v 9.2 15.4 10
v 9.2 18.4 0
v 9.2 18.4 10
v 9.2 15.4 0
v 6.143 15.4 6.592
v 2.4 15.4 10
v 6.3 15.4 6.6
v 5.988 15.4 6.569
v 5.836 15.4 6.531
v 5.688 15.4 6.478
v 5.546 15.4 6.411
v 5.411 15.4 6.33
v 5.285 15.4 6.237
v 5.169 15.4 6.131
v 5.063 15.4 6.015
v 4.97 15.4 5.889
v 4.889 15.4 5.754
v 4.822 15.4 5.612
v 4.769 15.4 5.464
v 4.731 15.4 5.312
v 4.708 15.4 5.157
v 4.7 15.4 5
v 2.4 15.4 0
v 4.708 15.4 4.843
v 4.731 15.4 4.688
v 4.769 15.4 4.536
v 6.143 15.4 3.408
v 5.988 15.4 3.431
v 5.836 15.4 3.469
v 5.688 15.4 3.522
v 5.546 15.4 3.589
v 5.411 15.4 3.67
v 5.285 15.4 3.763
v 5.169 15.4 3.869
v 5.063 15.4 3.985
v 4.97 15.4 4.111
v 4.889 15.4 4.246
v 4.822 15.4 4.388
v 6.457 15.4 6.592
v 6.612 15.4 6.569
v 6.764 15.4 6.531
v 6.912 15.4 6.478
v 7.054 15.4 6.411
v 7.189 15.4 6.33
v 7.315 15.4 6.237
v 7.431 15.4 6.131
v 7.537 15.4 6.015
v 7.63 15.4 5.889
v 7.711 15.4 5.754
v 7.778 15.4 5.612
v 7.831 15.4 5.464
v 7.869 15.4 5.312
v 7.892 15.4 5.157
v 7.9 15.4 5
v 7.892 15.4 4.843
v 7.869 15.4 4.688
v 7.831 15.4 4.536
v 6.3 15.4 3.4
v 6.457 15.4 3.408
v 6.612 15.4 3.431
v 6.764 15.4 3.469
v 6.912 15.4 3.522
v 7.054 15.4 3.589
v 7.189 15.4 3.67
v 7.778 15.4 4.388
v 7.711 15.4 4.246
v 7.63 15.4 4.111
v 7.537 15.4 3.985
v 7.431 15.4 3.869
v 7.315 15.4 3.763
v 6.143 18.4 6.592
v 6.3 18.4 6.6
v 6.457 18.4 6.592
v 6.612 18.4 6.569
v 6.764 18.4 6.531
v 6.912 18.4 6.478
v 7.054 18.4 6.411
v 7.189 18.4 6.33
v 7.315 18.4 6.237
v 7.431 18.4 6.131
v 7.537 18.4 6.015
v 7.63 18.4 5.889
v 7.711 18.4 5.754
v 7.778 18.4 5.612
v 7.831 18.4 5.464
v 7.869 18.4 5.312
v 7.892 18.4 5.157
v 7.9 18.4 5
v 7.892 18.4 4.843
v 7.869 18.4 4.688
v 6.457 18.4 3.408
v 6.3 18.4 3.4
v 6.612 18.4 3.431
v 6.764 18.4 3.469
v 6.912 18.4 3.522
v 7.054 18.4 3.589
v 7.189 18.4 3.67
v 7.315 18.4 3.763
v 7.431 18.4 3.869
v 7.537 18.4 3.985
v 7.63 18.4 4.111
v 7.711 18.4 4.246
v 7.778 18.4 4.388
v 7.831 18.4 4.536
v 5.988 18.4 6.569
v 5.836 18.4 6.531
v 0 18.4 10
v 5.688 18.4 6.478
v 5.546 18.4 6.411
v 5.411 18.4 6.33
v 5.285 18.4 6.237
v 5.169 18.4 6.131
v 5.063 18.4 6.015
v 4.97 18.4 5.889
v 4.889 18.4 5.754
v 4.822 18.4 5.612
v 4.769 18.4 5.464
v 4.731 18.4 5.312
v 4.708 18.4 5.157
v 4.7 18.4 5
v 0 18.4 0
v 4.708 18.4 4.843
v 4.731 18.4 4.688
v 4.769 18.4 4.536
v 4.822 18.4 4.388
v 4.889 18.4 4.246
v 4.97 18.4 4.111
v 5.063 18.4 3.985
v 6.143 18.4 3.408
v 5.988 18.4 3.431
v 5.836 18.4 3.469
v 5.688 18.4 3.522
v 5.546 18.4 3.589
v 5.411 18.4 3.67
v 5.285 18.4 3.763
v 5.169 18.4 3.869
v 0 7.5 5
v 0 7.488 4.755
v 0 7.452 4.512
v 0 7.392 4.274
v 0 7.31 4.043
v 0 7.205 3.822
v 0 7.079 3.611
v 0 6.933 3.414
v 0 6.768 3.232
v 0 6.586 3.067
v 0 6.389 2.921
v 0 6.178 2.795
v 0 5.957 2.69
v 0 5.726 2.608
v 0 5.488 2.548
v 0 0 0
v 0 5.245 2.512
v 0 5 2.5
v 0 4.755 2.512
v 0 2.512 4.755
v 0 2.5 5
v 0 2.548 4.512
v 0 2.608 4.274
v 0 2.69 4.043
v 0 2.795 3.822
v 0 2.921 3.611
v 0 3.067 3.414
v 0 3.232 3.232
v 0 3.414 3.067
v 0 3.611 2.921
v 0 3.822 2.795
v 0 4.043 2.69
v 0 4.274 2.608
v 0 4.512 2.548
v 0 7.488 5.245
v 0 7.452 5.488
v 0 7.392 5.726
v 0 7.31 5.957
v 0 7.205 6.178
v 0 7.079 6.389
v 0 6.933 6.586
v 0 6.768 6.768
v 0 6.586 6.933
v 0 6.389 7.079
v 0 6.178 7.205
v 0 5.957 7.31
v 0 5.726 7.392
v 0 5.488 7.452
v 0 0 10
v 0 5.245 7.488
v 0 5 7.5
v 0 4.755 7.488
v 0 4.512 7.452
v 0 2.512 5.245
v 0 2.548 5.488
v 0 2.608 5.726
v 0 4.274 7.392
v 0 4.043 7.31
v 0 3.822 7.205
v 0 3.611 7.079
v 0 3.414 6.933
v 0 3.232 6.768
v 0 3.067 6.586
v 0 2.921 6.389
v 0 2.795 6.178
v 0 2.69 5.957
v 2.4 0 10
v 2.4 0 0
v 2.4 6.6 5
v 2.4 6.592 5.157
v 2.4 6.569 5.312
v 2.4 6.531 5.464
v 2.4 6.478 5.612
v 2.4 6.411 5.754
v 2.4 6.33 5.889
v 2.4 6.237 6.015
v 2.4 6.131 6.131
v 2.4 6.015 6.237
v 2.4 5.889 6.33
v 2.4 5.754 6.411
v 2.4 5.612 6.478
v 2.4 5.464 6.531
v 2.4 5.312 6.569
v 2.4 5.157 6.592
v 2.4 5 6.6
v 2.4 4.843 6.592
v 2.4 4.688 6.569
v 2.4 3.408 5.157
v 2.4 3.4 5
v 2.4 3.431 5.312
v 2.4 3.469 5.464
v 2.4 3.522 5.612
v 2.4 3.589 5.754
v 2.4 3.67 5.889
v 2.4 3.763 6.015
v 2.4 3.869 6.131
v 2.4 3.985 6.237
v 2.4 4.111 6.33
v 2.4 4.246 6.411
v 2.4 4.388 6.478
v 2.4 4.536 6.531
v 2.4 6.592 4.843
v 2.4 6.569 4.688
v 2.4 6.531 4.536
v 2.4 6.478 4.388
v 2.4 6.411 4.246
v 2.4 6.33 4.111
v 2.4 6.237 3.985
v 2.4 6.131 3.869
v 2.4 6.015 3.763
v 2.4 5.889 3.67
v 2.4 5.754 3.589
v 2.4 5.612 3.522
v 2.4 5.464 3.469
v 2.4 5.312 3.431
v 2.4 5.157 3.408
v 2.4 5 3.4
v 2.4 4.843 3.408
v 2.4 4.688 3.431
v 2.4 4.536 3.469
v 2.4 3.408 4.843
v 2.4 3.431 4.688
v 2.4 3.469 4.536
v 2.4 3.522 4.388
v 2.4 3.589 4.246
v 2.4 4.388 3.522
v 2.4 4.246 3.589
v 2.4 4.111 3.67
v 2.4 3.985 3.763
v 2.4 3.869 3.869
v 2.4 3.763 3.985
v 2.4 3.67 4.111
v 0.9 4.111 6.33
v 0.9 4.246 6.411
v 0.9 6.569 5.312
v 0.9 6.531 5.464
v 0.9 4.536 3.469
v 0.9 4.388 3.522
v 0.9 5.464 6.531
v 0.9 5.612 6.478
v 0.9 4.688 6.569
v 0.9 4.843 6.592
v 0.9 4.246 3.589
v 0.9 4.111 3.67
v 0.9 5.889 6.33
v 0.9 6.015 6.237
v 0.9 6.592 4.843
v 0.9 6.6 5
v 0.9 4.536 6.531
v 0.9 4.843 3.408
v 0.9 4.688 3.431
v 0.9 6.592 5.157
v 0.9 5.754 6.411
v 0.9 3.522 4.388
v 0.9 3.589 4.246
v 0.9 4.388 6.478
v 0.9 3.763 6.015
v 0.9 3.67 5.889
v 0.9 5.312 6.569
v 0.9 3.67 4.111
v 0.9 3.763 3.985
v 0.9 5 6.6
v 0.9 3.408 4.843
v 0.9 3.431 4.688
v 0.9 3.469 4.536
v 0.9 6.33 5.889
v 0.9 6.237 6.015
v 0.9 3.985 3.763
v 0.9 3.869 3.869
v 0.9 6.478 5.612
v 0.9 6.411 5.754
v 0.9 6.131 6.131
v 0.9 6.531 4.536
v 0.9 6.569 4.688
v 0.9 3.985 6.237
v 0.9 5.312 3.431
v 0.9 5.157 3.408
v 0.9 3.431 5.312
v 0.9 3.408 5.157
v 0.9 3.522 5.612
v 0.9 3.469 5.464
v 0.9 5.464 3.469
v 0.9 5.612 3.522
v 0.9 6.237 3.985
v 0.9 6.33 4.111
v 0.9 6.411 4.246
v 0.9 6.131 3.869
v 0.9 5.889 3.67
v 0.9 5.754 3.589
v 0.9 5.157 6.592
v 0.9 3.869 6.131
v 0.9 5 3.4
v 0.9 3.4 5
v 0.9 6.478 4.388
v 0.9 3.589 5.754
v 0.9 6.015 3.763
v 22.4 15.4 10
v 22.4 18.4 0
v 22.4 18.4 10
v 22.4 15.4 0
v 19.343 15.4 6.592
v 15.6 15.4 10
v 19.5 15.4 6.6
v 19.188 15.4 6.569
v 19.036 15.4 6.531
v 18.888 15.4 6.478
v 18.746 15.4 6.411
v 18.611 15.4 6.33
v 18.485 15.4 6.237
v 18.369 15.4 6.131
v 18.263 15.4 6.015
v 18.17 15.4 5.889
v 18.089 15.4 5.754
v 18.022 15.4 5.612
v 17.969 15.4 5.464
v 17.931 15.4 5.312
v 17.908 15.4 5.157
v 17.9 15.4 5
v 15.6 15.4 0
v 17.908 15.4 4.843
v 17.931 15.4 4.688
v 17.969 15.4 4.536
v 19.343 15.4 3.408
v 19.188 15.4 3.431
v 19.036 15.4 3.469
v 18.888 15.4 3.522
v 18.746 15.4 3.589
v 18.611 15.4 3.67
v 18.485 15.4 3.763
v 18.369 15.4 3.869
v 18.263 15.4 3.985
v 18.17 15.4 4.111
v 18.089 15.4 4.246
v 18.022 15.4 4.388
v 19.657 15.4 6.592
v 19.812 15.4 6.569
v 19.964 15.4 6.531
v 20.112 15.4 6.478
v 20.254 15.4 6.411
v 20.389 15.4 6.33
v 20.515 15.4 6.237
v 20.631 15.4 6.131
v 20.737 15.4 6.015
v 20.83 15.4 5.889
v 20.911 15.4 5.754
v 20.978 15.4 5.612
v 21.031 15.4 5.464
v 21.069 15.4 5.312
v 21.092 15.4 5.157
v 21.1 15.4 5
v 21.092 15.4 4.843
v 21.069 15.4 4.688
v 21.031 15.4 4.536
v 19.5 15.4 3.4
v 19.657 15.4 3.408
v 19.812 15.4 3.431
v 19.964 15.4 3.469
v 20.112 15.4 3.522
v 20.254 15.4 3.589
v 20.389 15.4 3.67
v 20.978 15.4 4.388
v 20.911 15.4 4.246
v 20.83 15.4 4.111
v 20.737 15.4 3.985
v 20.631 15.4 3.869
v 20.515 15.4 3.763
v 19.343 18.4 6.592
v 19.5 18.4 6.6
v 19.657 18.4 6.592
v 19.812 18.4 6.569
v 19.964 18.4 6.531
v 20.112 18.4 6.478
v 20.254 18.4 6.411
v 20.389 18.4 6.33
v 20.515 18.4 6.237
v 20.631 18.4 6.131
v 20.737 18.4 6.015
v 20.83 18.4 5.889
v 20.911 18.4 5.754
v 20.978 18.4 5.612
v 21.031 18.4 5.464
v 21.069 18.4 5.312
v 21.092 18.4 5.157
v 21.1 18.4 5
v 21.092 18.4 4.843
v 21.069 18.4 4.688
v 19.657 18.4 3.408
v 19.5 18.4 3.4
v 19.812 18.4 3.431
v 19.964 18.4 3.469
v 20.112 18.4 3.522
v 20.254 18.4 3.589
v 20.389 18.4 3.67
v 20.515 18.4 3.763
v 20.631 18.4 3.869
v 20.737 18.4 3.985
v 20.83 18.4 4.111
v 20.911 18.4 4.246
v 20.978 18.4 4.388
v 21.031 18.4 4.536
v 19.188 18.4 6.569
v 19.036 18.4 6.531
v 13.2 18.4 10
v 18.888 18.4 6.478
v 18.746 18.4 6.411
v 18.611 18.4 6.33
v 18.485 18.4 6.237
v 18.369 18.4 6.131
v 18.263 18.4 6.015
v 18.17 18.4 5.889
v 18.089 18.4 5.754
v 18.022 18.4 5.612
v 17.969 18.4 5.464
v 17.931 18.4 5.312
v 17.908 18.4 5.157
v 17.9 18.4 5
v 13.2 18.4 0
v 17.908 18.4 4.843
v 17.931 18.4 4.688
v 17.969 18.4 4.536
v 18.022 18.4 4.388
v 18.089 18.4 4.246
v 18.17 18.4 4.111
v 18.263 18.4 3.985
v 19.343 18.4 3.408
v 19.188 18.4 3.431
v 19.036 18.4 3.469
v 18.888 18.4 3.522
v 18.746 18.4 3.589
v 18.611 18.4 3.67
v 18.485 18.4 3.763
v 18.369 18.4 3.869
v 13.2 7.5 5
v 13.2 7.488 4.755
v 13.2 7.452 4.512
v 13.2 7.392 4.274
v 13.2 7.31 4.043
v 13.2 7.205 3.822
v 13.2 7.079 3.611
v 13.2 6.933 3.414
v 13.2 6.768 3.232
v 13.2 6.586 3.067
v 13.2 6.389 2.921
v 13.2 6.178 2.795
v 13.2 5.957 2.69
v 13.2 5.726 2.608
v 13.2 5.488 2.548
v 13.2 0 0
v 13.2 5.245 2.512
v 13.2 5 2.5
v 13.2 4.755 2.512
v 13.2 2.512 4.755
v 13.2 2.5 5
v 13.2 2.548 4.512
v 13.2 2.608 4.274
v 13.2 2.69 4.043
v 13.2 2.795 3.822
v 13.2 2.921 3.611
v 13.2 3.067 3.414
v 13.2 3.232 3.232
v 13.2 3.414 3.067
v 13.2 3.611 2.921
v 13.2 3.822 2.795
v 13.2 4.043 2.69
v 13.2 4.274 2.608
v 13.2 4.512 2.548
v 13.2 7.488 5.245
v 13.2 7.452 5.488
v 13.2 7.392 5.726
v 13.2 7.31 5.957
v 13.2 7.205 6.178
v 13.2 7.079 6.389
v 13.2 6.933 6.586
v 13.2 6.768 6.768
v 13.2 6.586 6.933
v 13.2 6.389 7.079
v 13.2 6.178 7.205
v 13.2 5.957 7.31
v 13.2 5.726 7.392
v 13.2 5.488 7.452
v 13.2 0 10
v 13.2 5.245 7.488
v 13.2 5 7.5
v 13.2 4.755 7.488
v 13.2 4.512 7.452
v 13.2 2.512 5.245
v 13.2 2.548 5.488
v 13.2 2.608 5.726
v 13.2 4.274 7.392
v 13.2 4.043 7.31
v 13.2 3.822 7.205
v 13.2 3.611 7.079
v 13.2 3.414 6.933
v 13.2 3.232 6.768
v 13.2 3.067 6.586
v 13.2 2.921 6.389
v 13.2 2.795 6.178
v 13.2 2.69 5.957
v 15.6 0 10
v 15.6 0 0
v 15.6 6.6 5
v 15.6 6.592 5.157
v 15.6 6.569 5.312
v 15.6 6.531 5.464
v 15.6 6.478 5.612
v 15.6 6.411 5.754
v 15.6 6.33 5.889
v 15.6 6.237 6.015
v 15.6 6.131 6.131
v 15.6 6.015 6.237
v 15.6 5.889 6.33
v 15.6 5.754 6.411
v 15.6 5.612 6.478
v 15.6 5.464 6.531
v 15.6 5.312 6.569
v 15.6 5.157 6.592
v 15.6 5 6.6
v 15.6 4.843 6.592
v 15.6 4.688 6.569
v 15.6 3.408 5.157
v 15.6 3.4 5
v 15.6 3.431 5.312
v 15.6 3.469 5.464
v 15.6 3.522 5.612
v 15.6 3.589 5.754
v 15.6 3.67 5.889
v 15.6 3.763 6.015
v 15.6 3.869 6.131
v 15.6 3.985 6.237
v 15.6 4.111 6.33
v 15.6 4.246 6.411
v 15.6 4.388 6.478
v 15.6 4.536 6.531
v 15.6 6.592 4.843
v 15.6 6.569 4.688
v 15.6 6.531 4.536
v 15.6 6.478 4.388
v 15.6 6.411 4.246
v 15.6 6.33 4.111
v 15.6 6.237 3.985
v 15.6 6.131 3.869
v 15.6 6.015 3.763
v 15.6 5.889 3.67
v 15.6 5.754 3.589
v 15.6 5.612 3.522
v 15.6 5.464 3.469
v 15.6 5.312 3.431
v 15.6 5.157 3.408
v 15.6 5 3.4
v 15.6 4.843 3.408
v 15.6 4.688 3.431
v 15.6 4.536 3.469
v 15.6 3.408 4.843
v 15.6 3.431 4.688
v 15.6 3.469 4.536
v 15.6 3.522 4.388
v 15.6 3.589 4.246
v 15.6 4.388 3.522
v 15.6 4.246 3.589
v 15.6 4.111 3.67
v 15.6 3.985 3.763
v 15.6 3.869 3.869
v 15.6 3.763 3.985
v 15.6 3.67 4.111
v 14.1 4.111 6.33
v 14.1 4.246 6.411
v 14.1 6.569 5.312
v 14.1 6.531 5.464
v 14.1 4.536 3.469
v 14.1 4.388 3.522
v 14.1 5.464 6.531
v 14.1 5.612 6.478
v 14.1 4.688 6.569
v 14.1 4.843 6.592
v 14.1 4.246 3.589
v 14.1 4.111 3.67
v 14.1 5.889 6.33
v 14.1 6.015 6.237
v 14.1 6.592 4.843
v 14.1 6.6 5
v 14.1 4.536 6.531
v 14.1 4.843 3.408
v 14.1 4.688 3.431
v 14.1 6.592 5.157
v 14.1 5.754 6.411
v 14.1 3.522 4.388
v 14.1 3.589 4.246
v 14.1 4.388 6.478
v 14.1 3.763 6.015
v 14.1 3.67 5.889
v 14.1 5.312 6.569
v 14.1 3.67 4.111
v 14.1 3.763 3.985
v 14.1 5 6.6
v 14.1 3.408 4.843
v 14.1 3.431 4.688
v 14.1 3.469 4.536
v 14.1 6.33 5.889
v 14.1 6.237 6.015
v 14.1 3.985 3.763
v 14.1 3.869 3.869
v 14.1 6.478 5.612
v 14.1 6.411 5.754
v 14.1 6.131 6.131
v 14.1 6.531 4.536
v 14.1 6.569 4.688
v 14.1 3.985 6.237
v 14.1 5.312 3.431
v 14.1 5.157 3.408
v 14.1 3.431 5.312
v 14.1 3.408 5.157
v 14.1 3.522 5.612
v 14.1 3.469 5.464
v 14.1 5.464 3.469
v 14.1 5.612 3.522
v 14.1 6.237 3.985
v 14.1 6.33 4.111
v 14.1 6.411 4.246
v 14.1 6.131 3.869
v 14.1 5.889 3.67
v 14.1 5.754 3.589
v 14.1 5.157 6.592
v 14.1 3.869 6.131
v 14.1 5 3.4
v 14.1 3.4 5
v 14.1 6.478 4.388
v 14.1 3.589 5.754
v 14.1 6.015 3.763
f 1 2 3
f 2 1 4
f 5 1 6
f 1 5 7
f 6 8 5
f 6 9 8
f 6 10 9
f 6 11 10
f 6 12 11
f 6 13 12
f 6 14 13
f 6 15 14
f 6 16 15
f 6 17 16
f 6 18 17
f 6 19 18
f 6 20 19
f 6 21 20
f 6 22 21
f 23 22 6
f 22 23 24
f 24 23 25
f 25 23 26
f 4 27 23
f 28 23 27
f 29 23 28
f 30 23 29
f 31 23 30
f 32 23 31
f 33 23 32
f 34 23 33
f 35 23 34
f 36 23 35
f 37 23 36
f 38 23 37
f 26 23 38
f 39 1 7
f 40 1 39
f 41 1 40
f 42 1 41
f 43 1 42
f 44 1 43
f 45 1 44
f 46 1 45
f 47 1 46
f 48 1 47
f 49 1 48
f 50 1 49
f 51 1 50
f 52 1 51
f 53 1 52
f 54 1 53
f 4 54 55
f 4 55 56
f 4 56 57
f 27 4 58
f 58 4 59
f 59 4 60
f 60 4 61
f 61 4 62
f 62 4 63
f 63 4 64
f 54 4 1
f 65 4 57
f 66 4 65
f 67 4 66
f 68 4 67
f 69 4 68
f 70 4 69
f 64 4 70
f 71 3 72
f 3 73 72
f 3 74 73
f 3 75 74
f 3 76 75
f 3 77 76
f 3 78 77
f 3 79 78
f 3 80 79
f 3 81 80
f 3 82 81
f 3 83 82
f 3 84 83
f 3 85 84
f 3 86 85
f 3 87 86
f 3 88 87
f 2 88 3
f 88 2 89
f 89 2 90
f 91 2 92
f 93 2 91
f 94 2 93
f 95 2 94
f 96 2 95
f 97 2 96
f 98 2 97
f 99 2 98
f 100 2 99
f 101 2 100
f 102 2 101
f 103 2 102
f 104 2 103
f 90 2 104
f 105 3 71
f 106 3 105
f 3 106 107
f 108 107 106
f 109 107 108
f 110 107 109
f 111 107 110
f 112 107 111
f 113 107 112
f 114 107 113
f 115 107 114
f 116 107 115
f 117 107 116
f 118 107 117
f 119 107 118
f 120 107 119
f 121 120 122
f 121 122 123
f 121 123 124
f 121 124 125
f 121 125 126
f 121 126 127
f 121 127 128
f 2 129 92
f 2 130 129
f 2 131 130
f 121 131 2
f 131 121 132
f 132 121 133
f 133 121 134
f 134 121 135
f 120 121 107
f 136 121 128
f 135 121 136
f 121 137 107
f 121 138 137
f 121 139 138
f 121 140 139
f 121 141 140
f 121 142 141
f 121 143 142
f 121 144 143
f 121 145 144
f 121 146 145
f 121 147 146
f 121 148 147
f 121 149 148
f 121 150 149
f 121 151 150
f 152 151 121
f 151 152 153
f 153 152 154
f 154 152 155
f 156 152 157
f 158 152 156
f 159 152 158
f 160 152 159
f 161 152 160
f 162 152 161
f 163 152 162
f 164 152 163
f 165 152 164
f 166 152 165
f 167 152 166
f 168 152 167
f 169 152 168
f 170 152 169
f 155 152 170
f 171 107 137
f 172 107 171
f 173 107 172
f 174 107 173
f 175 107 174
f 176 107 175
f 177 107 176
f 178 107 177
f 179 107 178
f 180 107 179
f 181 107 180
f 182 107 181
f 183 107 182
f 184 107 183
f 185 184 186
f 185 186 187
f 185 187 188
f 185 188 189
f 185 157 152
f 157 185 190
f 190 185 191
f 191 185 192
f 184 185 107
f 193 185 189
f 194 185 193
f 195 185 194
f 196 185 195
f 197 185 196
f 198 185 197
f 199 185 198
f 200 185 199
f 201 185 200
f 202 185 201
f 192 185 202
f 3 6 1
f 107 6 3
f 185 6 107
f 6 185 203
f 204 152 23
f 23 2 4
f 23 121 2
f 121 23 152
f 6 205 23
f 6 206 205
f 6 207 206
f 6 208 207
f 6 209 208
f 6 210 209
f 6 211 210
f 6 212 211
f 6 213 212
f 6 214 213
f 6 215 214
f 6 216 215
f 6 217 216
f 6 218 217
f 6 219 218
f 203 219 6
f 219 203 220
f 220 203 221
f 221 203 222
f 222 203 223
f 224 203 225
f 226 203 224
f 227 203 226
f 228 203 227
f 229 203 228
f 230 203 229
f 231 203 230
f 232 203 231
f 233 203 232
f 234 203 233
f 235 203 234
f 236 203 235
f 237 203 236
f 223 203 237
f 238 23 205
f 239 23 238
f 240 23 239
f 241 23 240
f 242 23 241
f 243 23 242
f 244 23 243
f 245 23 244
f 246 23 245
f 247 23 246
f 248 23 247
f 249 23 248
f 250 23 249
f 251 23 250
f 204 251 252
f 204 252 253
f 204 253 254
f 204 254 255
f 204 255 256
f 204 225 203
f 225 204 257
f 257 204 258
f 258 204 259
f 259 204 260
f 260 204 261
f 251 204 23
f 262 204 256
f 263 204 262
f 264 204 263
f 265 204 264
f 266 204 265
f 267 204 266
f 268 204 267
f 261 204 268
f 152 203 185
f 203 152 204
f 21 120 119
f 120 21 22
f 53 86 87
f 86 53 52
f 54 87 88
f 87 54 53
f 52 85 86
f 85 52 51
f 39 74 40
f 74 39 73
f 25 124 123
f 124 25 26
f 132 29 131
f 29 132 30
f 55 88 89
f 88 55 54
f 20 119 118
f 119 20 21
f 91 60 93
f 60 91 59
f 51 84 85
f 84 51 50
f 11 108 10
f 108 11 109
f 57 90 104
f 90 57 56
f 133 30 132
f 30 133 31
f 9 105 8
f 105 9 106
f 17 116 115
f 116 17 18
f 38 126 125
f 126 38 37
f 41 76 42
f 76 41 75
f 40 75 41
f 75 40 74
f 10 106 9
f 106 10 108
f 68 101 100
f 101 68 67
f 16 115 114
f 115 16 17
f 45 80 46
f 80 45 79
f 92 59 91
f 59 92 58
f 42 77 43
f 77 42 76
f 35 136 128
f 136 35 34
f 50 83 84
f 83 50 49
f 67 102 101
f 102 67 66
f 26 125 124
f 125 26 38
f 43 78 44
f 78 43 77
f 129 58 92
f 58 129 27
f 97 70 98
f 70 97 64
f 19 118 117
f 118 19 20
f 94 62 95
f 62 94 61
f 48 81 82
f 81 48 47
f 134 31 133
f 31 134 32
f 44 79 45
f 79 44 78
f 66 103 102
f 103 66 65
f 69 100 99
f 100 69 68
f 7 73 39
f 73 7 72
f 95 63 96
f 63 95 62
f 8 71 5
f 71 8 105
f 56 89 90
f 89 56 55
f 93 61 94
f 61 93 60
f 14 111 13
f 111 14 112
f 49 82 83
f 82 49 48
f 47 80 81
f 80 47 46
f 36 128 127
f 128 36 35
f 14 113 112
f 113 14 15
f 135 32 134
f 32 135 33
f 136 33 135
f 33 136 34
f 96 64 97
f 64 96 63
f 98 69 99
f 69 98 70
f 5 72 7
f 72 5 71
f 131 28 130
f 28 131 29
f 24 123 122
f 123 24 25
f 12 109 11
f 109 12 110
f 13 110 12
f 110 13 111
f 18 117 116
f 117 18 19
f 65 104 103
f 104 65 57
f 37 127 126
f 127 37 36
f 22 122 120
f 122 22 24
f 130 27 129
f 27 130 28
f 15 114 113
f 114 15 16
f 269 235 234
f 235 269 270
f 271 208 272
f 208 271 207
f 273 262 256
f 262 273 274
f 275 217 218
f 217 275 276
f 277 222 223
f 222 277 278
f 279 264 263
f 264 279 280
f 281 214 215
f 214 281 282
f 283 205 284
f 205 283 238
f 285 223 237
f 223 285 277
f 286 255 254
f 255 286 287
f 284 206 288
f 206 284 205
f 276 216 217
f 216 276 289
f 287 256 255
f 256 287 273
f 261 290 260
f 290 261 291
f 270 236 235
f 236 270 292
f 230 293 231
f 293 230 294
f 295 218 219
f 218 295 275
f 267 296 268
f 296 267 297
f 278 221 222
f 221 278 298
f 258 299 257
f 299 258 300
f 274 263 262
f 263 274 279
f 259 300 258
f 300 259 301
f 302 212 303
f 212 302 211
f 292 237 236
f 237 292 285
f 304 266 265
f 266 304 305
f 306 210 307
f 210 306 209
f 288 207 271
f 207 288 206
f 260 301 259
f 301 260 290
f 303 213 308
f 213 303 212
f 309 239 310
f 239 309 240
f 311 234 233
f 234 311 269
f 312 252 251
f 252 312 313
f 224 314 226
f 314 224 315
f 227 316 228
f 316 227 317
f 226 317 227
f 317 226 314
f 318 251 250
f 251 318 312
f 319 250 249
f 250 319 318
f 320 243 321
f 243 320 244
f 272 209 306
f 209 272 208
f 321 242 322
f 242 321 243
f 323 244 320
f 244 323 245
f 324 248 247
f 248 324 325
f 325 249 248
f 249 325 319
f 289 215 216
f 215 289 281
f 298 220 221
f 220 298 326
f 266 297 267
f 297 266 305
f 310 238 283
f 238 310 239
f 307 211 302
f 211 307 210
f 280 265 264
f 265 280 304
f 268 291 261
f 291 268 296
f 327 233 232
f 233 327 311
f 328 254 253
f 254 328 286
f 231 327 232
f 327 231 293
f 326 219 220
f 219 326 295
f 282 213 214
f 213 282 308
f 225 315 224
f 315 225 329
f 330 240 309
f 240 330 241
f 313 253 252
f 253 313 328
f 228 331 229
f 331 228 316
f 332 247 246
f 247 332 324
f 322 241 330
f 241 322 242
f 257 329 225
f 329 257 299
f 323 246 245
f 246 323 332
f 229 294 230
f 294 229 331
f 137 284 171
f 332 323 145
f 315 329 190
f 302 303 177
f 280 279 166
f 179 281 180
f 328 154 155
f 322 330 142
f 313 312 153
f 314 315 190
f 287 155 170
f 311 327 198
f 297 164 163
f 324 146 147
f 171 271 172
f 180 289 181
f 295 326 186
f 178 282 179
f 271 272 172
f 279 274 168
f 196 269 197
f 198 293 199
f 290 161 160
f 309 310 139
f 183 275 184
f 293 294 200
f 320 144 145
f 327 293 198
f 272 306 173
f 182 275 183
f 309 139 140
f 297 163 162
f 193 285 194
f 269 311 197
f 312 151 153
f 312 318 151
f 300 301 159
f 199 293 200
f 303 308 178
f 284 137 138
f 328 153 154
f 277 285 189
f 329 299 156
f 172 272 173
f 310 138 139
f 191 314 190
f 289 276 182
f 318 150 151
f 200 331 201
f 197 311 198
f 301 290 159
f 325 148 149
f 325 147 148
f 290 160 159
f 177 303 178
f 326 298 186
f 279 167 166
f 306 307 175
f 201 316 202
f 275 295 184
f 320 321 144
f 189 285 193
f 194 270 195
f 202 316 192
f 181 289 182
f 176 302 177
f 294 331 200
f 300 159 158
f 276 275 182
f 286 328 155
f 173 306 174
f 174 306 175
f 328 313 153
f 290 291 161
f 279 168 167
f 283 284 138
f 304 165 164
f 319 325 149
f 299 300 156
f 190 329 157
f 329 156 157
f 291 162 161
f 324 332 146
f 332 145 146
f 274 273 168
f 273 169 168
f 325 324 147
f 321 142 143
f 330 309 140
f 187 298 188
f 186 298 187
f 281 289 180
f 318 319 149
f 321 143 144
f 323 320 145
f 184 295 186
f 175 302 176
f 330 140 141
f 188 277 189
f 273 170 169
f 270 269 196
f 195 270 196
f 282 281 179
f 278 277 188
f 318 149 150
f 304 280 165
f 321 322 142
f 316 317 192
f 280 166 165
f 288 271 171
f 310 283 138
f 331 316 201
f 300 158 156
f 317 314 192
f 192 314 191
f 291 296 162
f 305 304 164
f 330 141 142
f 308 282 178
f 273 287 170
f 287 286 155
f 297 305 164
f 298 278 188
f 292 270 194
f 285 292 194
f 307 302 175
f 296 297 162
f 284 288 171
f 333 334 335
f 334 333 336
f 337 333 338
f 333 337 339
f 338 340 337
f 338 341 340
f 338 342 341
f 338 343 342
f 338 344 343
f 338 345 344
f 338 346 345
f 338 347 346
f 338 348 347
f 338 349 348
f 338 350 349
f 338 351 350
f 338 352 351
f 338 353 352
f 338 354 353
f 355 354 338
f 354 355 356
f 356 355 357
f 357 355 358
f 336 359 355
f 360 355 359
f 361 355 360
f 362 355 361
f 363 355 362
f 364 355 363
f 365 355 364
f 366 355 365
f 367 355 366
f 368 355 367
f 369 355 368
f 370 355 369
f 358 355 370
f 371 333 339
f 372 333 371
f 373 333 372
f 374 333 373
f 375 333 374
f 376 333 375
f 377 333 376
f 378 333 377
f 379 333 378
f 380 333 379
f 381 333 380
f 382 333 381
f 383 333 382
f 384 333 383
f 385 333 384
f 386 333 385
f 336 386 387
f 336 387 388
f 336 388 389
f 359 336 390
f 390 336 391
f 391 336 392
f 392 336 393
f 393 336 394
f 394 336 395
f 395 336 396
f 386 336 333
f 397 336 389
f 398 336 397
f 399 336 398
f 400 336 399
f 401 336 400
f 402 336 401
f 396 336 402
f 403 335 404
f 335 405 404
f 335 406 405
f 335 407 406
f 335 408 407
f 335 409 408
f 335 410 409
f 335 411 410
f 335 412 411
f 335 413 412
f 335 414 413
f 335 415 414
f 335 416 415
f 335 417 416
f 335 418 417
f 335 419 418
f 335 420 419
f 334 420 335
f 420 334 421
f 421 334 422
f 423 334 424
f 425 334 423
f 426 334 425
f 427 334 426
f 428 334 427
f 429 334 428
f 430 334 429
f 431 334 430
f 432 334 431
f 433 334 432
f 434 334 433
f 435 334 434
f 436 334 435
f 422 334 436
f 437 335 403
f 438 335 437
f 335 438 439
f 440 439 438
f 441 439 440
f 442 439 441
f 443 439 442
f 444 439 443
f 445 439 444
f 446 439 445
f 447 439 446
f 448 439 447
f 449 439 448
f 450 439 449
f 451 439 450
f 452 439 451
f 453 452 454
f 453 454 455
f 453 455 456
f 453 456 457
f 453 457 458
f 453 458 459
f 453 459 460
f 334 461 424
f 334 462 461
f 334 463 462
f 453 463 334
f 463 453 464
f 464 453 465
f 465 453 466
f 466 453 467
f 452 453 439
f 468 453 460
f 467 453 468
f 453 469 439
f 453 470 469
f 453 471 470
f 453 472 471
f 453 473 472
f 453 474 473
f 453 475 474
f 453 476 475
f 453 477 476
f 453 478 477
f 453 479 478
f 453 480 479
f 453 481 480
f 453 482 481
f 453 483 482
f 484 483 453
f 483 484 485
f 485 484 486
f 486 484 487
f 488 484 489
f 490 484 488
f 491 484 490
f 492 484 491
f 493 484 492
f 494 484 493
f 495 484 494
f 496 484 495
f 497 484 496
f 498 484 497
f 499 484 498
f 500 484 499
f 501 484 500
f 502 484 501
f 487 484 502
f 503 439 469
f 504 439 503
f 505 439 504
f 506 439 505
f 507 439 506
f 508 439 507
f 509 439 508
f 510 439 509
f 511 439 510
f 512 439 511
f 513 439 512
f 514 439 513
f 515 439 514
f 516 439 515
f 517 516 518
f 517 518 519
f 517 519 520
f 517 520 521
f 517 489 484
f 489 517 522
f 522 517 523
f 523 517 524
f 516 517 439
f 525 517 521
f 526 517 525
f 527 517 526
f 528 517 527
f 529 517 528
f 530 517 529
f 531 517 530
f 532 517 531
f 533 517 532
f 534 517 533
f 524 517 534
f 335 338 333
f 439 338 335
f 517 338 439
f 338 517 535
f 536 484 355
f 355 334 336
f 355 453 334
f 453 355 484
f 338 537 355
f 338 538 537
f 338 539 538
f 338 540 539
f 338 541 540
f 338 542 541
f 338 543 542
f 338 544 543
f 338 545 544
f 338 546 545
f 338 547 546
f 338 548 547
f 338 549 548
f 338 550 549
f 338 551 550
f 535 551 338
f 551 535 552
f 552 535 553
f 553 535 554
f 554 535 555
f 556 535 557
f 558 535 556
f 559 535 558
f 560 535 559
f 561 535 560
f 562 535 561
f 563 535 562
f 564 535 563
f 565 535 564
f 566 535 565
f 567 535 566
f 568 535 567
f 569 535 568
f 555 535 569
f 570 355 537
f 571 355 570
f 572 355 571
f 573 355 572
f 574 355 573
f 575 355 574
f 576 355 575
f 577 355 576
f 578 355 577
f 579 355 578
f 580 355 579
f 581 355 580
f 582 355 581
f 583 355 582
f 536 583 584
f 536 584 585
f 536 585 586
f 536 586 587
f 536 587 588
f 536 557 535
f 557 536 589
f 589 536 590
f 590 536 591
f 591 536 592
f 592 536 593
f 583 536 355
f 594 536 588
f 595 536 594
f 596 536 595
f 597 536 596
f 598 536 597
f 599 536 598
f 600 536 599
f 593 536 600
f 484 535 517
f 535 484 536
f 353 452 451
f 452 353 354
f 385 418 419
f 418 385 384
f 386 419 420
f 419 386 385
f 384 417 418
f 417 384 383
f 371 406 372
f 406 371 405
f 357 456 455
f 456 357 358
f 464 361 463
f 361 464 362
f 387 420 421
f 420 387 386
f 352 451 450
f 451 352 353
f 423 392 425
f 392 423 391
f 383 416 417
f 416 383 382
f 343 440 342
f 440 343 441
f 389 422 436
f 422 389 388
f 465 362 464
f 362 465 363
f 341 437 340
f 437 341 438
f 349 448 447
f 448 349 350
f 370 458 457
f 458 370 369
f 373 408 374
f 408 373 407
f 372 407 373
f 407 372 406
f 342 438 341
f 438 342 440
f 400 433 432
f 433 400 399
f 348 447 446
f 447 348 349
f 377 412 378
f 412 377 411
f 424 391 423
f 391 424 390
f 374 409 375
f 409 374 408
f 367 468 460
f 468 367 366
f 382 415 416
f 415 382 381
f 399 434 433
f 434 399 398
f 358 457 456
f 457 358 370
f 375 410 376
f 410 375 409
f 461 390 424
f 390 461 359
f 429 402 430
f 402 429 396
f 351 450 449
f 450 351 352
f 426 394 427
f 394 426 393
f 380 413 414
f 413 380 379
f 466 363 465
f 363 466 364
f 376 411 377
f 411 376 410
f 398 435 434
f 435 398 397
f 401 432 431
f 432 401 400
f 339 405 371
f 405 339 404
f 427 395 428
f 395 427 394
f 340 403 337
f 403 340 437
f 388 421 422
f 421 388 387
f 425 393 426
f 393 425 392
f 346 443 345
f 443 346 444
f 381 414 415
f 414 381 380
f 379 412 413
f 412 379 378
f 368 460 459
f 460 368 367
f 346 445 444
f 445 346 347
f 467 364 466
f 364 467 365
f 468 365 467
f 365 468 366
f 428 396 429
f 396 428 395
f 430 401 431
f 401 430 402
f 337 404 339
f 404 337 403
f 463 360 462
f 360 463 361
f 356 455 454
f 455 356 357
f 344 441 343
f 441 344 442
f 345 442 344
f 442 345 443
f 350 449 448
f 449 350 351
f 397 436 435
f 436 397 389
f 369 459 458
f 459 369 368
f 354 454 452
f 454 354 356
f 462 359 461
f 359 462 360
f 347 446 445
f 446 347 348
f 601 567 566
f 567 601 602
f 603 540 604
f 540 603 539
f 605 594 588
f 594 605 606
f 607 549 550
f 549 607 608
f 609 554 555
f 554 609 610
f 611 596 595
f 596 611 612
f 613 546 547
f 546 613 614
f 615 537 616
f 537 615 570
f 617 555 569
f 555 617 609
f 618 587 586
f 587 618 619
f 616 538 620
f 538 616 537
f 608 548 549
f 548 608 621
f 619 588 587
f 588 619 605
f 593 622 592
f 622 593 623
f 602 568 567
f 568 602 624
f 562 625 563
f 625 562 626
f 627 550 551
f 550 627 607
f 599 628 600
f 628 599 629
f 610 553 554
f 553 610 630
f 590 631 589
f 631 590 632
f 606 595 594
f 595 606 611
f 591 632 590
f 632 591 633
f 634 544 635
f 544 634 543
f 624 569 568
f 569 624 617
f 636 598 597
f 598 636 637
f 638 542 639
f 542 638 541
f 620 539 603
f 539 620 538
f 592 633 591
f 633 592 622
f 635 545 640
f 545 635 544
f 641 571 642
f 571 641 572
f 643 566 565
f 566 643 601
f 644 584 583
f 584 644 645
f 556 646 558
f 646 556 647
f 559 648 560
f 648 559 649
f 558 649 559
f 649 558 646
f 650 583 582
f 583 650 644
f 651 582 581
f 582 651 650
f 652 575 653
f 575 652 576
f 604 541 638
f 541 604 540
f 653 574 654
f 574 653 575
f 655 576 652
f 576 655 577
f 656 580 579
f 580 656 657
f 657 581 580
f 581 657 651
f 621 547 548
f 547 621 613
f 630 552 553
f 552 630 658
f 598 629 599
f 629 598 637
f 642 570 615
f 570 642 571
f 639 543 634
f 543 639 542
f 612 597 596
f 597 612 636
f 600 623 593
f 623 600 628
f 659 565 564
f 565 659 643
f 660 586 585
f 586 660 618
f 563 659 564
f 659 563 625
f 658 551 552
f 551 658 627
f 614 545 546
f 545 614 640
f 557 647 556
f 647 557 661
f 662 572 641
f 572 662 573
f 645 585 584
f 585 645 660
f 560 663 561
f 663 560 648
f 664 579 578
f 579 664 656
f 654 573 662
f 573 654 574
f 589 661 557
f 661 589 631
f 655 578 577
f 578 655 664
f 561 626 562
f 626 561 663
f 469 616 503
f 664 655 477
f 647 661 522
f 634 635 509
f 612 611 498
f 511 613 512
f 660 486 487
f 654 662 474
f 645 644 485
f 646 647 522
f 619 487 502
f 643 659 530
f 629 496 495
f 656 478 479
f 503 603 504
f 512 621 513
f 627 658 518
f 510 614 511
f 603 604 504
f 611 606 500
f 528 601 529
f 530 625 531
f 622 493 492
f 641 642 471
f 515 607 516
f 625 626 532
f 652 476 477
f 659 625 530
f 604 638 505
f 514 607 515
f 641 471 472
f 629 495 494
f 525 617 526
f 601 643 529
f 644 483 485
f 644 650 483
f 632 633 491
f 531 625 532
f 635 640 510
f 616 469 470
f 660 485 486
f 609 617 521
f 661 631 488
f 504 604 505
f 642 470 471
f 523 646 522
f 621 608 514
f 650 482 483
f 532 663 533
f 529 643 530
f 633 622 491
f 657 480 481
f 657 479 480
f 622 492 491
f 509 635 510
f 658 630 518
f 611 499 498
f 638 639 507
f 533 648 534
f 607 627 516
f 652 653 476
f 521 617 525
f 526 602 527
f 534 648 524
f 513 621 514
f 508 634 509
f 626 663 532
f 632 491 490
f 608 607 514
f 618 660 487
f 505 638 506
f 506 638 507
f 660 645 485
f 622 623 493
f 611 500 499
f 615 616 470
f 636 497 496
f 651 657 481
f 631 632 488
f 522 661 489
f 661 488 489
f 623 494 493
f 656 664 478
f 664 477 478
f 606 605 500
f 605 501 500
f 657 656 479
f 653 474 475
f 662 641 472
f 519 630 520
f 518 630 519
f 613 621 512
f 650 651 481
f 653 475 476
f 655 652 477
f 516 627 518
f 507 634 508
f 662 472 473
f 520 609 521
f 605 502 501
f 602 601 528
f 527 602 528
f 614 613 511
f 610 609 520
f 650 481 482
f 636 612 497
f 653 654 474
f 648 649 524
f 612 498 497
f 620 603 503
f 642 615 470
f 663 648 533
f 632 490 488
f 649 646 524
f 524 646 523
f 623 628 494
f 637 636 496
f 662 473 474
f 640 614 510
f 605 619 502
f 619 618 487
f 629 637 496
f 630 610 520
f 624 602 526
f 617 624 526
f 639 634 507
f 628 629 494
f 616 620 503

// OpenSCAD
// usb-power-45w: copied unchanged from modules/usb-power/hardware/mechanics/corner_braces.scad (M1 preview).
// A4.1: TWO IDENTICAL PLAIN L BRACKETS. mm. ABS fit prototype.
// No captive nuts, pockets, roofs, inserts or standoffs. Two bores per part.
// Local origin = assembly X0.1, Y=centre-5, Z1.6. Centres Y22 and Y106.5.
// Upright touches main PCB BACK face X2.5, not its component face.
// Front: M3x8 pan/button screw + loose M3 nut; hole assembly X6.4.
// Side: M3x8 90-degree flat countersunk screw + loose nut on PCB F.Cu side.
// Countersink is in printed plastic ONLY, never in the 1.6mm PCB or panel.
// Use plain nuts AF<=5.5, thickness<=2.4; no washers in these length stacks.
// Print L outline flat as arranged; measure ABS shrinkage and bore fit.
// No STL/slicer/strength/physical-fit qualification is claimed.
$fn=64;
width_x=9.2;
width_y=10;
depth_z=18.4;
foot=3.0;          // panel foot, unchanged
web=2.4;           // PCB upright: 0.6mm thinner than the old 3.0mm wall
front_x=6.3;
side_z=13.4;
clearance=3.2;
countersink_diameter=5.0;  // M3 flat head, 5.0mm max diameter
countersink_depth=0.9;     // 90 degrees: (5.0-3.2)/2; leaves 1.5mm

module bracket() {
    difference() {
        union() {
            cube([width_x,width_y,foot]);
            cube([web,width_y,depth_z]);
        }
        // Front/panel hole along Z, accessible loose nut above foot.
        translate([front_x,width_y/2,-.1])
            cylinder(h=foot+.2,d=clearance);
        // Side hole along X. Screw head flush with OUTER/left plastic face.
        translate([-.1,width_y/2,side_z]) rotate([0,90,0])
            cylinder(h=web+.2,d=clearance);
        translate([0,width_y/2,side_z]) rotate([0,90,0])
            cylinder(h=countersink_depth,d1=countersink_diameter,d2=clearance);
    }
}
// Flat L-profile print orientation; local Y is the print height (10mm).
translate([0,depth_z,0]) rotate([90,0,0]) bracket();
translate([width_x+4,depth_z,0]) rotate([90,0,0]) bracket();
